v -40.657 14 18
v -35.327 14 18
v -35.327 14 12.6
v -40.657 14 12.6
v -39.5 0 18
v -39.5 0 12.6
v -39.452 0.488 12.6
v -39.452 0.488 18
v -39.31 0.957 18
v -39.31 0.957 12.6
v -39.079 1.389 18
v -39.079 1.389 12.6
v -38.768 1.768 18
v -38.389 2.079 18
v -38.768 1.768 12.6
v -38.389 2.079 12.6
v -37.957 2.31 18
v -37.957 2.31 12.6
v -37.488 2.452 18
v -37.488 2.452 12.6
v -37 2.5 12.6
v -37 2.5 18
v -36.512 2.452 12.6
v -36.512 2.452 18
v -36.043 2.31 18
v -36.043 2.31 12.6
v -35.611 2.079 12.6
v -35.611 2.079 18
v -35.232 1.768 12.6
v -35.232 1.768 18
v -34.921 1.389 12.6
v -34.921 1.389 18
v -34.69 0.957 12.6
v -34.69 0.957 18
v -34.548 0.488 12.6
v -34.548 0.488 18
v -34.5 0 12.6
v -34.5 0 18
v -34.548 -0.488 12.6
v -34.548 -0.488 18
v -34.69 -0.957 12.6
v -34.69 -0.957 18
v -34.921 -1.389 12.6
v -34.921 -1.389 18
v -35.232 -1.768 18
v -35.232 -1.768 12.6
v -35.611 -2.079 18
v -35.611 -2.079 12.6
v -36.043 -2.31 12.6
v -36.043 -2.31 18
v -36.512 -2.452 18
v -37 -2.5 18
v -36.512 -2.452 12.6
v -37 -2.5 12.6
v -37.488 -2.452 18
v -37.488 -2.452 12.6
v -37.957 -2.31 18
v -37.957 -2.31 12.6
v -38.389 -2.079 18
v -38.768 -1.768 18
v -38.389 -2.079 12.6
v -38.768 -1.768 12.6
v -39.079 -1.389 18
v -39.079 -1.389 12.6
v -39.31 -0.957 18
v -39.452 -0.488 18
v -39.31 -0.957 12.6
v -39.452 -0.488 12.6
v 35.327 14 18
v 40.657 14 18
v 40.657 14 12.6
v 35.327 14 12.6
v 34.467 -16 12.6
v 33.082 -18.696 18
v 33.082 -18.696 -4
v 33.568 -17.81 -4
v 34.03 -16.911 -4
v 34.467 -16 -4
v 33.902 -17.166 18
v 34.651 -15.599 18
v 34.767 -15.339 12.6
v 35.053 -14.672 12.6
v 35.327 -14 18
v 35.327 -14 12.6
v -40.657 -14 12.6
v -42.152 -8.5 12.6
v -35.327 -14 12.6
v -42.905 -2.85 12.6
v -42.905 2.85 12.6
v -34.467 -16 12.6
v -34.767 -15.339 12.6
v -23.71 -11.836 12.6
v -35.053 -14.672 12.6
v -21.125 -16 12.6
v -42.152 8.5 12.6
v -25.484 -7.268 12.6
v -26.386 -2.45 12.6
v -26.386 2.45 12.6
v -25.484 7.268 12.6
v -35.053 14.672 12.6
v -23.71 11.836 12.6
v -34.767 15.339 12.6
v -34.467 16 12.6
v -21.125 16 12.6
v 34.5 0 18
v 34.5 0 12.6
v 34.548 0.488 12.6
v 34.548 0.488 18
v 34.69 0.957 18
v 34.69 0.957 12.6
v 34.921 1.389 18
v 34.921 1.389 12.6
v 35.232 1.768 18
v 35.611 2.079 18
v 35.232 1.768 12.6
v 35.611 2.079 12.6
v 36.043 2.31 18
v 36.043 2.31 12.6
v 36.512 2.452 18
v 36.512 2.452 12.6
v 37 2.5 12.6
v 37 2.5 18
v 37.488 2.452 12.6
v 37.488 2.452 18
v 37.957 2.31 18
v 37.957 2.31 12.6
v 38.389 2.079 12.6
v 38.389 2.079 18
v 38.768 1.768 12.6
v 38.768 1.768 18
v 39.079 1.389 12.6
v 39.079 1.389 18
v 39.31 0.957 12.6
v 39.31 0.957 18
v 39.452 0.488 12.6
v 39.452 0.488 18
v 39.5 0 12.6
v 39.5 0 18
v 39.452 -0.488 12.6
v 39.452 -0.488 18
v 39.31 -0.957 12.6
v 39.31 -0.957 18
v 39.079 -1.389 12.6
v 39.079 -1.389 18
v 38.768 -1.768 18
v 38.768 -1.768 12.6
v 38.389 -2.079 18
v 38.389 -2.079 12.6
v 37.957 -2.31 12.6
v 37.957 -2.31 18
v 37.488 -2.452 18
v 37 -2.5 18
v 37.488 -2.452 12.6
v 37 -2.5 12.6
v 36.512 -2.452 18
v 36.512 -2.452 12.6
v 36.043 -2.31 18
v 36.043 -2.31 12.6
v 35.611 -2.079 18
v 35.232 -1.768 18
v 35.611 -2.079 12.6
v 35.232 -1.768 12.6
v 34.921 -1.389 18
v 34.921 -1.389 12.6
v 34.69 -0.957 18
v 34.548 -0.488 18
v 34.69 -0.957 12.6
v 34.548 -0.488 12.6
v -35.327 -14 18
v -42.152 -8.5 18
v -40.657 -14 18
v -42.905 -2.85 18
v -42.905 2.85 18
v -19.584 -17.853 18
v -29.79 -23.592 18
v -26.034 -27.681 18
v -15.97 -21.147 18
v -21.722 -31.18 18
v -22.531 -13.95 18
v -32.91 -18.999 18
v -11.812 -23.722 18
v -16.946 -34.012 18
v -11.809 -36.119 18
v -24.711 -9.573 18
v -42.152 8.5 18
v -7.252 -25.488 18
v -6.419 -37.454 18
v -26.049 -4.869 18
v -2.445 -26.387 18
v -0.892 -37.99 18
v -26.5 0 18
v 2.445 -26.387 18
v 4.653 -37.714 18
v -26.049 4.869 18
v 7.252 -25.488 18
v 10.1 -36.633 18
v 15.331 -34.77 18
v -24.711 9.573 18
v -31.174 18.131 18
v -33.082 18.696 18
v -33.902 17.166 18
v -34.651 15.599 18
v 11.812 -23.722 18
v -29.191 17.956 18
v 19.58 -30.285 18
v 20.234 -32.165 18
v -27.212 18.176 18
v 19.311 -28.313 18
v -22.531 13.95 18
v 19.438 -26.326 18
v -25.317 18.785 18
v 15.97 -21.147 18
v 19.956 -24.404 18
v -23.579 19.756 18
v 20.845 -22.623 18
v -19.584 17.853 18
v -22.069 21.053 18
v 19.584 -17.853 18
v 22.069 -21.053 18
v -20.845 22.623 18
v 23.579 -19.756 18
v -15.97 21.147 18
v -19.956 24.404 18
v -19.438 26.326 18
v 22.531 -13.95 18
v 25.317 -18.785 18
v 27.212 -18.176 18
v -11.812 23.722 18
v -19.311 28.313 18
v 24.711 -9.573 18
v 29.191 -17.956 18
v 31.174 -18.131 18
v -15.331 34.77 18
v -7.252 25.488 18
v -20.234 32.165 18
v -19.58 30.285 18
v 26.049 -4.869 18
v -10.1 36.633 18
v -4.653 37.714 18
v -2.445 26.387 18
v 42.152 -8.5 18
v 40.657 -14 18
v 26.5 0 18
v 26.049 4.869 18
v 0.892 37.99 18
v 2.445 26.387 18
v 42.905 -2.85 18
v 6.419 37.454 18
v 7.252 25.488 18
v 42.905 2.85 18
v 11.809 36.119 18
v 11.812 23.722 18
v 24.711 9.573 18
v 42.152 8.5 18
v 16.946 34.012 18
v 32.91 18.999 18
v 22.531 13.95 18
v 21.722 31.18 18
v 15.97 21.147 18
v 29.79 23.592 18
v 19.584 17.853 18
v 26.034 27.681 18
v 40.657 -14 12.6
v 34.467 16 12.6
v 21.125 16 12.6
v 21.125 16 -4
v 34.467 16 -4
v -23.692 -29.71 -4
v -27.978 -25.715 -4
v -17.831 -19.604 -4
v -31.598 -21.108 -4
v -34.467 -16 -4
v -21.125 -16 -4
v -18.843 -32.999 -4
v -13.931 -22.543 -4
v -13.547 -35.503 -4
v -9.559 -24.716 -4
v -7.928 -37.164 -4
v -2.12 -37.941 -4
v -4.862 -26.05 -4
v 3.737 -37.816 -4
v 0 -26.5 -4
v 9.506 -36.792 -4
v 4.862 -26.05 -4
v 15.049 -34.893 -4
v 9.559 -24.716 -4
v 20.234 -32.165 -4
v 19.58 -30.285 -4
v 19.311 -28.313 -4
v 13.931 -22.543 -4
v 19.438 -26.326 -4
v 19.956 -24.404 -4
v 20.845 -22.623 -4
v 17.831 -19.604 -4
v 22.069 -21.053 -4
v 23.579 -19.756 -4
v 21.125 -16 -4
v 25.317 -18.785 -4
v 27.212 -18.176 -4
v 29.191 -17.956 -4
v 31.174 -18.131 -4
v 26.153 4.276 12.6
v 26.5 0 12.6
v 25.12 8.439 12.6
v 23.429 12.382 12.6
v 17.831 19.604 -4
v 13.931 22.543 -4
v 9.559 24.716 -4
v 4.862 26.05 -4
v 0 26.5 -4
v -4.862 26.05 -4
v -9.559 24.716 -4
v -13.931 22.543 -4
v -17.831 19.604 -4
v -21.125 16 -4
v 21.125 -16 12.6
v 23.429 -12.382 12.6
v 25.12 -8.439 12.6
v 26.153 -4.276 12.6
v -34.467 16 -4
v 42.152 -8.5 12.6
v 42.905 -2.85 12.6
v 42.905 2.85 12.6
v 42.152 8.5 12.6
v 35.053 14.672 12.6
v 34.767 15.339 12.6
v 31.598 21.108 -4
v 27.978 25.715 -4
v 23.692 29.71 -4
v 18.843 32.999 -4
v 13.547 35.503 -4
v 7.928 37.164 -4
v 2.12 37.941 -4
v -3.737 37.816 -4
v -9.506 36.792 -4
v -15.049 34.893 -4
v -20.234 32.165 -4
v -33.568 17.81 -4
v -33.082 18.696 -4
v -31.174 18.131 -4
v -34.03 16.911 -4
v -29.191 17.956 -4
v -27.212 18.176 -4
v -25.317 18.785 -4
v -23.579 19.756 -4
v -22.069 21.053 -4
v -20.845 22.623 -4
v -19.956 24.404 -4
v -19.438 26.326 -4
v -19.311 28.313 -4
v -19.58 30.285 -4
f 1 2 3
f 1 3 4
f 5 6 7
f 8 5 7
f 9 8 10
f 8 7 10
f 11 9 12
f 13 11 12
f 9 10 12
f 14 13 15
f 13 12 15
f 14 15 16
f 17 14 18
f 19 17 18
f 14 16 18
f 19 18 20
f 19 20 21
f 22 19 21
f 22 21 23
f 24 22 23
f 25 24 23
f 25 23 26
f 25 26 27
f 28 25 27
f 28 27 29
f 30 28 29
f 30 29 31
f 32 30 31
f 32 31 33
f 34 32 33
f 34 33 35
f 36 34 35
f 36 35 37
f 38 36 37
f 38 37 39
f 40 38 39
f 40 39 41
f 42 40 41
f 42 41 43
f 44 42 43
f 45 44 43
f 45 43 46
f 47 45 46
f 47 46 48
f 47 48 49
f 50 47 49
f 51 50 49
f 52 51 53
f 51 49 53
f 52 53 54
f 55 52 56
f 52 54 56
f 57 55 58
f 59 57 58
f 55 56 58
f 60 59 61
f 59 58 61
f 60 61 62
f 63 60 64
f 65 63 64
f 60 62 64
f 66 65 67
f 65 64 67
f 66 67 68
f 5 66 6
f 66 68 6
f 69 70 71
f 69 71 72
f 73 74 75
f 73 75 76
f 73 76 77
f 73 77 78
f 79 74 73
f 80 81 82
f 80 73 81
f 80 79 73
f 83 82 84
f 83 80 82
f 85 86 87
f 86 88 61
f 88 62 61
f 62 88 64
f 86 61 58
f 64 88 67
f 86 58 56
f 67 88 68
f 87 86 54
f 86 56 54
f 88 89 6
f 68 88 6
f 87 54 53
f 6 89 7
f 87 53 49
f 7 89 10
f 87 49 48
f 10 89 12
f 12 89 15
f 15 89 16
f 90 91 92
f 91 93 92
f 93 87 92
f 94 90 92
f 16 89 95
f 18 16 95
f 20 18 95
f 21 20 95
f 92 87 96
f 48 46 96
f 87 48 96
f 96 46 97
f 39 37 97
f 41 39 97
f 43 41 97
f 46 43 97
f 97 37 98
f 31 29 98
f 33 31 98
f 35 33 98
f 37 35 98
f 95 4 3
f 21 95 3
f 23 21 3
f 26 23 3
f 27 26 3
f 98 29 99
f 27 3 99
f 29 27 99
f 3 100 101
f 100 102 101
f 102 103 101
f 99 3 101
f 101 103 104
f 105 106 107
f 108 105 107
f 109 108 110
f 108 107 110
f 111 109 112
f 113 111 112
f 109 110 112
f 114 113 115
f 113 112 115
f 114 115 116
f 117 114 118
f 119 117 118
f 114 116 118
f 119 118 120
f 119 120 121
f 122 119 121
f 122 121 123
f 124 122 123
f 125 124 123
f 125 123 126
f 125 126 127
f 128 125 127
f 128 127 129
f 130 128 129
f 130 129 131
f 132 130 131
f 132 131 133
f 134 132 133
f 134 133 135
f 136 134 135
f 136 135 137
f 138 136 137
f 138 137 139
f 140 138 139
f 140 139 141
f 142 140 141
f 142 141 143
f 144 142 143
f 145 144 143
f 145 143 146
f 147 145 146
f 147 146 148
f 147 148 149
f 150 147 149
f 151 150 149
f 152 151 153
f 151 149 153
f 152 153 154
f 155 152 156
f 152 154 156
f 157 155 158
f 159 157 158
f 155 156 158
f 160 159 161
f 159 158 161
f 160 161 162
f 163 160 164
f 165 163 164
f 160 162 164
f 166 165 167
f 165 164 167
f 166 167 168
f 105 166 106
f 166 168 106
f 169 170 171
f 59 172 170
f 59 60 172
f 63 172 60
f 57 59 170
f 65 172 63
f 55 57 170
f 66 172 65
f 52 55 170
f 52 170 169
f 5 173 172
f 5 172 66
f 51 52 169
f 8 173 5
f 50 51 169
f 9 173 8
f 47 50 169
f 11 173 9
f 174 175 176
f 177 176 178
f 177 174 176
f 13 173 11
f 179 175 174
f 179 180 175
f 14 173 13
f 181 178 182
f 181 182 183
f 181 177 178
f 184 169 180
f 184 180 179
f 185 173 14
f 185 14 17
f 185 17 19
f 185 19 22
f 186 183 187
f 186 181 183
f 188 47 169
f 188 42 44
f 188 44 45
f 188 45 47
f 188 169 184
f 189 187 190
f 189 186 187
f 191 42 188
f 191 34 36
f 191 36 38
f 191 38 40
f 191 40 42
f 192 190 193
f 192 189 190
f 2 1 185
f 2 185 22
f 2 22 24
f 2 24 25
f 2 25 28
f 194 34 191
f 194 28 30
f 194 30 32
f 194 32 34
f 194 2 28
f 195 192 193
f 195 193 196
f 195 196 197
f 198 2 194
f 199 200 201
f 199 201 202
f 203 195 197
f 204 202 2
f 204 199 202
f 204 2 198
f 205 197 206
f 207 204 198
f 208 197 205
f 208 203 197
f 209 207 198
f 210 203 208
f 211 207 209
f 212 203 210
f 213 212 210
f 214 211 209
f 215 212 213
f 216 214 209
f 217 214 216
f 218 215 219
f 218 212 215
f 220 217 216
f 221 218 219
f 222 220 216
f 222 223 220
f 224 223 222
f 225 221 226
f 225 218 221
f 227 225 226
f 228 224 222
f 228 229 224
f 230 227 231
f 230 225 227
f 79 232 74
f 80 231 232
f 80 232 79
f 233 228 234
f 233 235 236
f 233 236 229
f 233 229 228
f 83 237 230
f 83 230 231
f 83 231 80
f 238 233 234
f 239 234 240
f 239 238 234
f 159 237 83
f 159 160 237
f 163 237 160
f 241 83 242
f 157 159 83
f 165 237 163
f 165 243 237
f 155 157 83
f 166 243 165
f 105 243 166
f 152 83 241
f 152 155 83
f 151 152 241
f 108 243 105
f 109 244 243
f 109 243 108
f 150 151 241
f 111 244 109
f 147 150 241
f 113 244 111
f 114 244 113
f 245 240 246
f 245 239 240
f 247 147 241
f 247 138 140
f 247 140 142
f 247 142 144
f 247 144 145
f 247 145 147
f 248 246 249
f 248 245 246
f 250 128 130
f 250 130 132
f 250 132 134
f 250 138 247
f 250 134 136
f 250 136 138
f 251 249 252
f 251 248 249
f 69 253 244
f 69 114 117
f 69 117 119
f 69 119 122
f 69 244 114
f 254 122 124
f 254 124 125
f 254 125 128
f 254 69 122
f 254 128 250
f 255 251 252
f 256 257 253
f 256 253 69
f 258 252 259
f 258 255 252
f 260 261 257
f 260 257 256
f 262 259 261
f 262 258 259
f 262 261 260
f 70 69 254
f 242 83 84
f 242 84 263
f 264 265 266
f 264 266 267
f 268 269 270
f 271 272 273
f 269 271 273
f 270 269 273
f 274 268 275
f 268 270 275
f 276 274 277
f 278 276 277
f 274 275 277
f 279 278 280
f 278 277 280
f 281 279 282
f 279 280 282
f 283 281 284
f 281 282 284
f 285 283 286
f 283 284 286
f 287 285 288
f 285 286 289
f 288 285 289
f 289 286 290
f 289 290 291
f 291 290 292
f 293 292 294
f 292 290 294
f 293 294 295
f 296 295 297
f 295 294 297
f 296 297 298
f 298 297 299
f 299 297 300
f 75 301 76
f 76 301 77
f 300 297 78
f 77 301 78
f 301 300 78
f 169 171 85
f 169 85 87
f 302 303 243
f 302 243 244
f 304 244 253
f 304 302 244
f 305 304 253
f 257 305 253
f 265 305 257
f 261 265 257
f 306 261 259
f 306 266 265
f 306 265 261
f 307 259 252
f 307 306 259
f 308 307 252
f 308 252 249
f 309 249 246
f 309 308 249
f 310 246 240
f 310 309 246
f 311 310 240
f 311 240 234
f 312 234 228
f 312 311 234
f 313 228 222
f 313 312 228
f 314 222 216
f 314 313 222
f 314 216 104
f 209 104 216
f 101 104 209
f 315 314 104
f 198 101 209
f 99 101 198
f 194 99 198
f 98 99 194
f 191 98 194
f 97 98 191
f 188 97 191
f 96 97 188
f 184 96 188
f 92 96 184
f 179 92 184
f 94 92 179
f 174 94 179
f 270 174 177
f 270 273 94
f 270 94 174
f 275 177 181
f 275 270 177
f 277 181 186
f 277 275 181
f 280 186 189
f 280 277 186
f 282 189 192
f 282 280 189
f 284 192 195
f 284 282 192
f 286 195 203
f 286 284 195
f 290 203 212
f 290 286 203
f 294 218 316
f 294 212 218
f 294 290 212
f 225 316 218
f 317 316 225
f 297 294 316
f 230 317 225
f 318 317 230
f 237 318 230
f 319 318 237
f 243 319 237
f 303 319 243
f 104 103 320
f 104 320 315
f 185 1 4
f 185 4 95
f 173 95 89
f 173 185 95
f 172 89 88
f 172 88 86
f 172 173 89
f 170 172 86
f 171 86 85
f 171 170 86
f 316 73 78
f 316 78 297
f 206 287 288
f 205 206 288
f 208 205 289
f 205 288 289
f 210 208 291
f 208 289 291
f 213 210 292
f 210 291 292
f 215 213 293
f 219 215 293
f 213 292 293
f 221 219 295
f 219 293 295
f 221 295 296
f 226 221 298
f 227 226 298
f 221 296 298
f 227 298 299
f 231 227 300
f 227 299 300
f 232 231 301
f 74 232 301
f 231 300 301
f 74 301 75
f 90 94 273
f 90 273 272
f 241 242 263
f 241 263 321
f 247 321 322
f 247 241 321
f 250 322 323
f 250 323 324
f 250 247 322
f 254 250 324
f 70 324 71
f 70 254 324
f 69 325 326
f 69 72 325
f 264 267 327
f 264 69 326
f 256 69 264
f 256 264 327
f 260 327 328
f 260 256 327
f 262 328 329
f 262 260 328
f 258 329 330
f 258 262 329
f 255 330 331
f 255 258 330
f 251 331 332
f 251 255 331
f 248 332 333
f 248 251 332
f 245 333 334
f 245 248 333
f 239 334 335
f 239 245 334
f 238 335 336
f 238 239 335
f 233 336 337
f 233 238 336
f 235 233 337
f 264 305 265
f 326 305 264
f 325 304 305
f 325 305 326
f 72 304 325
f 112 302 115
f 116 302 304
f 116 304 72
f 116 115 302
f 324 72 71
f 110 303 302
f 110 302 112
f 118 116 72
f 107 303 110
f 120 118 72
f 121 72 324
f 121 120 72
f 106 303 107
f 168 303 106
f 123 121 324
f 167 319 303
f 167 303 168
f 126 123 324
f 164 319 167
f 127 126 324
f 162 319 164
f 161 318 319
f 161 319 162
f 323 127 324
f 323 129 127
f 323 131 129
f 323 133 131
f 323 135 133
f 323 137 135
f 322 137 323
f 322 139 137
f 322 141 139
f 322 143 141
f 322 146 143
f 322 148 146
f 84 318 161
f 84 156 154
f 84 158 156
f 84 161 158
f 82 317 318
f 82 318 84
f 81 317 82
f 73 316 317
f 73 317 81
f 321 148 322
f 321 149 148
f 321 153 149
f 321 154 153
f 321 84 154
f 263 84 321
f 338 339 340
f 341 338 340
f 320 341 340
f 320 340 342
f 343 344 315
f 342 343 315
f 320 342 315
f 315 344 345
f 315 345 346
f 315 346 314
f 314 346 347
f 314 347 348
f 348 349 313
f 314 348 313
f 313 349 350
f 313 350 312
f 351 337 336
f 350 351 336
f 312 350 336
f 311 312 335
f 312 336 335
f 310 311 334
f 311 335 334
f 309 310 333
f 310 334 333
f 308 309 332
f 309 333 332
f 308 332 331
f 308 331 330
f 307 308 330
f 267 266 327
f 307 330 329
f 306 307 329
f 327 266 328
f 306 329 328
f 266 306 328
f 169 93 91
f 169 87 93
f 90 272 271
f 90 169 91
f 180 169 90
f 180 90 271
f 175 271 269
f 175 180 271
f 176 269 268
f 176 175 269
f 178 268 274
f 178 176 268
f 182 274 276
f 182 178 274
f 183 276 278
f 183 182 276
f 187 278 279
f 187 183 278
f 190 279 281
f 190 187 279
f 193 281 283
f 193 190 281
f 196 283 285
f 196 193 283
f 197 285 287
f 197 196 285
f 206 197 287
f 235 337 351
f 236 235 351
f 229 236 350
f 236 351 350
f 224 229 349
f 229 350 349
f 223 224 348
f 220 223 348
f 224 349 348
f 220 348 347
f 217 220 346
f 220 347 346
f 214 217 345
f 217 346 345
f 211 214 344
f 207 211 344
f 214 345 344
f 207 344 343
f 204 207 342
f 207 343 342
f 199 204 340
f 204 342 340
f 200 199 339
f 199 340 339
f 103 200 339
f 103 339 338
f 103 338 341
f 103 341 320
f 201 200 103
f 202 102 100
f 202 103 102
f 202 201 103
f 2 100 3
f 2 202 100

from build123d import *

# Parameters (mm, degrees)
F0_R          = 38
F0_R_2        = 26.5
F1_DEPTH      = 18
F1_DEPTH_BACK = 4
F3_DEPTH      = 5.4
F5_DEPTH      = 16.601
F7_D          = 5
F8_D          = 20


with BuildPart() as f1:
    # F0 (on Top) → F1 (new body, two sides)
    with BuildSketch(Plane.XY) as f1_sk:
        Circle(F0_R)
        Circle(F0_R_2, mode=Mode.SUBTRACT)
    extrude(amount=F1_DEPTH)
    extrude(f1_sk.sketch, amount=-F1_DEPTH_BACK)

    # F2 (on face) → F3 (join)
    with BuildSketch(Plane.XY.offset(18)):
        with BuildLine():
            Line((-35.327043, 14), (-40.657103, 14))
            ThreePointArc((-40.657103, 14), (-43, 0), (-40.657103, -14))
            Line((-40.657103, -14), (-35.327043, -14))
            ThreePointArc((-35.327043, -14), (-38, 0), (-35.327043, 14))
        make_face()
        with BuildLine():
            Line((-28.217902, 14), (-35.327043, 14))
            ThreePointArc((-35.327043, 14), (-38, 0), (-35.327043, -14))
            Line((-35.327043, -14), (-28.217902, -14))
            ThreePointArc((-28.217902, -14), (-31.5, 0), (-28.217902, 14))
        make_face()
        with BuildLine():
            ThreePointArc((38, 0), (37.32578, 7.126442), (35.327043, 14))
            Line((35.327043, 14), (28.217902, 14))
            ThreePointArc((28.217902, 14), (31.5, 0), (28.217902, -14))
            Line((28.217902, -14), (35.327043, -14))
            ThreePointArc((35.327043, -14), (37.32578, -7.126442), (38, 0))
        make_face()
        with BuildLine():
            Line((40.657103, 14), (35.327043, 14))
            ThreePointArc((35.327043, 14), (37.32578, 7.126442), (38, 0))
            ThreePointArc((38, 0), (37.32578, -7.126442), (35.327043, -14))
            Line((35.327043, -14), (40.657103, -14))
            ThreePointArc((40.657103, -14), (43, 0), (40.657103, 14))
        make_face()
    extrude(amount=-F3_DEPTH)

    # F4 (on face) → F5 (cut, through all)
    with BuildSketch(Plane(origin=(0, 0, 12.6), x_dir=(1, 0, 0), z_dir=(0, 0, -1))):
        with BuildLine():
            Line((-15.099669, 16), (-34.467376, 16))
            ThreePointArc((-34.467376, 16), (-38, 0), (-34.467376, -16))
            Line((-34.467376, -16), (-15.099669, -16))
            ThreePointArc((-15.099669, -16), (-22, 0), (-15.099669, 16))
        make_face()
        with BuildLine():
            ThreePointArc((15.099669, 16), (22, 0), (15.099669, -16))
            Line((15.099669, -16), (34.467376, -16))
            ThreePointArc((34.467376, -16), (38, 0), (34.467376, 16))
            Line((34.467376, 16), (15.099669, 16))
        make_face()
    extrude(amount=F5_DEPTH, mode=Mode.SUBTRACT)

    # F7 (through all)
    with Locations(Plane.XY.offset(18)):
        with Locations((-37, 0), (37, 0)):
            Hole(F7_D / 2)

    # F8 (through all)
    with Locations(Plane.XY.offset(18)):
        with Locations((-29.304576, 27.955175), (29.304576, -27.955175)):
            Hole(F8_D / 2)


solid = f1.part
